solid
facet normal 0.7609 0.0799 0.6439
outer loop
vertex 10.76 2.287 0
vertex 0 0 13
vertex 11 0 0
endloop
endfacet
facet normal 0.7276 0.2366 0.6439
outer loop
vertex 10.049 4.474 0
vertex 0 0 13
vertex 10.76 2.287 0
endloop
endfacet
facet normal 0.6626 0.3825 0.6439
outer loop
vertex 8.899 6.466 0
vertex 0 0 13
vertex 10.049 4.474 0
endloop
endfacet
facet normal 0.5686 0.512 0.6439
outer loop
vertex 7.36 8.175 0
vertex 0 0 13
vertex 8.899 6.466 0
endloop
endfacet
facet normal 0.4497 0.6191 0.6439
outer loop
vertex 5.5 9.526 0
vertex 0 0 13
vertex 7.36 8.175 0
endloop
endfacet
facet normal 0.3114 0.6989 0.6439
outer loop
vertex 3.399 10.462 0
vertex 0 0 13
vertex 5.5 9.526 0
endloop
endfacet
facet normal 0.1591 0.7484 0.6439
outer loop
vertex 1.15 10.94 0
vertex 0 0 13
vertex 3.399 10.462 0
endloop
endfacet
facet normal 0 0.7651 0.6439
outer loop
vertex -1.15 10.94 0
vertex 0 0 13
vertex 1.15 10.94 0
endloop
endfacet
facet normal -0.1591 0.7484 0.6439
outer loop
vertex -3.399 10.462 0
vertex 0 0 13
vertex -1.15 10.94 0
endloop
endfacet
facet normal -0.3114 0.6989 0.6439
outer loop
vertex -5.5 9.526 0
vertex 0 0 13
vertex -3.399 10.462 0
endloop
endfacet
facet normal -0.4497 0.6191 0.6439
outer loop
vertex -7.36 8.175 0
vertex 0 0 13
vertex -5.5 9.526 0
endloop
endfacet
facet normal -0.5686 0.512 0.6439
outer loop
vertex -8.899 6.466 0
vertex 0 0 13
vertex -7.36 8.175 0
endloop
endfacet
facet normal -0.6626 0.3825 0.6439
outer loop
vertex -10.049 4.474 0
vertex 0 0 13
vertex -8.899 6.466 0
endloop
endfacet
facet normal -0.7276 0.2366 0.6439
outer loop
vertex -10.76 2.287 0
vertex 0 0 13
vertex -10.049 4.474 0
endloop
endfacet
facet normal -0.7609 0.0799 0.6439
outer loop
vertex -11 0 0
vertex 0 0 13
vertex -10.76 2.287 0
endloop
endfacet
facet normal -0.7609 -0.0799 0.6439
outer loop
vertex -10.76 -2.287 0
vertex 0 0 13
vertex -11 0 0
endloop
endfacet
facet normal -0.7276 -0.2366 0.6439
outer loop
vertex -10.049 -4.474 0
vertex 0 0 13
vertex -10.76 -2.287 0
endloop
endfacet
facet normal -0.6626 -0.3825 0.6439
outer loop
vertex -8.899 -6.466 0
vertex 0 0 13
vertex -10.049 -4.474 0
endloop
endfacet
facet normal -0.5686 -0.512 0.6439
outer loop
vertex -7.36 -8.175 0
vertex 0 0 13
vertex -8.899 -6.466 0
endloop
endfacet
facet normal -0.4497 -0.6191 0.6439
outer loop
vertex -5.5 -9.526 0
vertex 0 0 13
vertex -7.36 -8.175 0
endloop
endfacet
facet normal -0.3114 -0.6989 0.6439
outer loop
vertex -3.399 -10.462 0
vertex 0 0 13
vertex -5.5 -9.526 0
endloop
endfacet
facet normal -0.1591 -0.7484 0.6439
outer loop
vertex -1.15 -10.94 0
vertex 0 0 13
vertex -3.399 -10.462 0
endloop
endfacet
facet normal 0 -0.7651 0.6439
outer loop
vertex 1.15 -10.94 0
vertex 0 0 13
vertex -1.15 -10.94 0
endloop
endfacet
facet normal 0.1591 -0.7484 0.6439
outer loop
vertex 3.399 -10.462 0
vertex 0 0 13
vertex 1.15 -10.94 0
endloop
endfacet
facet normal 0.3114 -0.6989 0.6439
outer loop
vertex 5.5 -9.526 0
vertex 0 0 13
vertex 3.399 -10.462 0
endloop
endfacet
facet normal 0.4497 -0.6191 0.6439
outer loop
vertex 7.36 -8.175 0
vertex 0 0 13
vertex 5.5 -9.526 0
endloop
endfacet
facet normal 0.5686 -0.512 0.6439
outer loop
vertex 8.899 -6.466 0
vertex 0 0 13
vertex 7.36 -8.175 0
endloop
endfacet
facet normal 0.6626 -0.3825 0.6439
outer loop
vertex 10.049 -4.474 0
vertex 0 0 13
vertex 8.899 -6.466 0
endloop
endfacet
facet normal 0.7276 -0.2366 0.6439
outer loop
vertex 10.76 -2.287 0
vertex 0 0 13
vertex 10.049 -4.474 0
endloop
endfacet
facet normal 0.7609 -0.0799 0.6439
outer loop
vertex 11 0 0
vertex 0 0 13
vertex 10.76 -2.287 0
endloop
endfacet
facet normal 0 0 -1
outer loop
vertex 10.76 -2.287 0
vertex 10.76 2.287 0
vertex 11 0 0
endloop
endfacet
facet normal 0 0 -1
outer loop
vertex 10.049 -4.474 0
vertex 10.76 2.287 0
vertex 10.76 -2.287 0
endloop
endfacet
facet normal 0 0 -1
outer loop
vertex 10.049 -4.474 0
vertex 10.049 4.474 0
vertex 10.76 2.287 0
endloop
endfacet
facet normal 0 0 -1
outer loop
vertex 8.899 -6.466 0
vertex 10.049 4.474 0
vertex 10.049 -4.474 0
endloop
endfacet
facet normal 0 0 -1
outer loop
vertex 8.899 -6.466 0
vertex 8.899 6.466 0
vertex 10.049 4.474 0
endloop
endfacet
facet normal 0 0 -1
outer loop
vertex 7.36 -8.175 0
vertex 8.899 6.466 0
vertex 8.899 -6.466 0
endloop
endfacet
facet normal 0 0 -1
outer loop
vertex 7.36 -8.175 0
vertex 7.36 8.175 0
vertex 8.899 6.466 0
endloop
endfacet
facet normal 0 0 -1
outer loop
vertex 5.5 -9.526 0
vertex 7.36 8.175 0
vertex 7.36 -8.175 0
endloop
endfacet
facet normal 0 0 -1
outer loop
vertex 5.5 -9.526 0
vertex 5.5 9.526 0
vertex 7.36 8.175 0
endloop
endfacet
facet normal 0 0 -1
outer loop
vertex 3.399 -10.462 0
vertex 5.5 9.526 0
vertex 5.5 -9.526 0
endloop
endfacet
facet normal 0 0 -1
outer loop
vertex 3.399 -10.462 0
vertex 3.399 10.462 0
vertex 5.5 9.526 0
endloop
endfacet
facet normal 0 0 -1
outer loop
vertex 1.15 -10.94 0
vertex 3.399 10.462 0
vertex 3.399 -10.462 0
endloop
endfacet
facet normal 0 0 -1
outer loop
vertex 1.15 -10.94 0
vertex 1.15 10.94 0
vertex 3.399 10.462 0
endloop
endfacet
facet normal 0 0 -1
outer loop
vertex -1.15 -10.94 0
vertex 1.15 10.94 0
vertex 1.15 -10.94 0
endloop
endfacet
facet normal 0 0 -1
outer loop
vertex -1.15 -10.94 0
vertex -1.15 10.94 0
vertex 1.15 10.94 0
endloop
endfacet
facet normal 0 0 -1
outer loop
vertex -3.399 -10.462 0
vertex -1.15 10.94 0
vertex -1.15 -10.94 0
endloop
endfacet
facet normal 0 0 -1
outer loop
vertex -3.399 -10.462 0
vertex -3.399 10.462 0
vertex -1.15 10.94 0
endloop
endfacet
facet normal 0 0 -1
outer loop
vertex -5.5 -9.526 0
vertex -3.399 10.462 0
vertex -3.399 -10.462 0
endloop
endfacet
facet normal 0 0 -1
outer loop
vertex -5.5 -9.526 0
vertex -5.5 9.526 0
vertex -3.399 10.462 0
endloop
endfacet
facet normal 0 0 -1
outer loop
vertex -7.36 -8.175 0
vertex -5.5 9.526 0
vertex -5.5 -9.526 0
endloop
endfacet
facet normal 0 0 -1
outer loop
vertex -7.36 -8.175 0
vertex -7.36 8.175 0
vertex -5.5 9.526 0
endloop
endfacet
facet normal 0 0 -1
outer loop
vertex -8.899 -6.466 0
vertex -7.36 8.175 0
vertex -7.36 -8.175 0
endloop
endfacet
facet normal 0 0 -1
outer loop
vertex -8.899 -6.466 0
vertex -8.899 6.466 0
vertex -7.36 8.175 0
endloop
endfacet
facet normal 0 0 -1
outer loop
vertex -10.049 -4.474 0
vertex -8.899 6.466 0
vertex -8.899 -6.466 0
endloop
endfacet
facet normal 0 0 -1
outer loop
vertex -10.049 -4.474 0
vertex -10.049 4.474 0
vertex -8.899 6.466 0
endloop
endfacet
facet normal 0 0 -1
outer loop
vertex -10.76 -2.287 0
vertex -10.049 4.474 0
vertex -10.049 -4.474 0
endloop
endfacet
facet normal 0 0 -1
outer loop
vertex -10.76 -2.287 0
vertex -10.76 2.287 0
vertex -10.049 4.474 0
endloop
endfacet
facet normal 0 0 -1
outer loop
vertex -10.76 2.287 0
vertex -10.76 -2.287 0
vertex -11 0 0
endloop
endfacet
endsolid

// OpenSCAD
// Generated by SolidPython 1.0.1 on 2020-07-29 00:46:43


cylinder(h = 13, r1 = 11, r2 = 0);
/***********************************************
*********      SolidPython code:      **********
************************************************
 
# import packages: SolidPython
from solid import *
from solid.utils import *
from itertools import chain, combinations, permutations


class Resize:

    def __init__(self, scad_file):
        self.scad_file = scad_file
        #self.scad_file = import_scad(scad_file)
        # cone/cylinder param:
        self.r1 = 0
        self.r2 = 0
        self.h = 0
        # rectangular prism param:
        self.w = 0
        self.l = 0
        # ellipse param:
        self.r = 0

    # import OpenScad code (file name corresponds to shape)


    # classify shape + parameters
    def assign(self, param1, param2, param3):
        if self.scad_file == 'cone.scad':
            self.r1 = param1
            self.r2 = param2
            self.h = param3
        elif self.scad_file == 'cylinder.scad':
            self.r1 = param1
            self.r2 = param2
            self.h = param3
        elif self.scad_file == 'rectangularPrism.scad':
            self.h = param1
            self.l = param2
            self.w = param3
        else:
            self.r = param1
            self.h = param2

    # resize parameters
    def iterate(self):
        x = range(3, 20, 2)
        i = 1
        if self.scad_file == 'cone.scad':
            tempList = list(permutations(x, 2))
            for temp in tempList:
                param1 = temp[0]
                param2 = temp[1]
                filepath = 'produced_scad_files/' + 'cone' + str(param1) + '_' + str(param2) + '_' + '.scad'
                scad_render_to_file(cylinder(h=param1, r1=param2, r2=0), filepath)

        elif self.scad_file == 'cylinder.scad':
            tempList = list(permutations(x, 3))
            for temp in tempList:
                param1 = temp[0]
                param2 = temp[1]
                filepath = 'produced_scad_files/' + 'cylinder' + str(param1) + '_' + str(param2) + '_' + '.scad'
                scad_render_to_file(cylinder(h=param1, r1=param2, r2=param2), filepath)

        elif self.scad_file == 'rectangularPrism.scad':
            tempList = list(permutations(x, 3))
            for temp in tempList:
                param1 = temp[0]
                param2 = temp[1]
                param3 = temp[2]
                filepath = 'produced_scad_files/' + 'rectangularPrism' + str(param1) + '_' + str(param2) + '_' + str(
                    param3) + '.scad'
                scad_render_to_file(cube(size=(param1, param2, param3)), filepath)

        elif self.scad_file == 'ellipse.scad':
            tempList = list(permutations(x, 4))
            for temp in tempList:
                param1 = temp[0]
                param2 = temp[1]
                param3 = temp[2]
                param4 = temp[3]
                filepath = 'produced_scad_files/' + 'ellipse' + str(param1) + '_' + str(param2) + '_' + str(param3) + '_' + str(param4) + '.scad'
                scad_render_to_file(scale([param1, param2, param3])(sphere(r=param4)), filepath)

    def render_to_scadfile(self):
        scad_render_to_file(scad, 'example.scad') 
 
************************************************/
